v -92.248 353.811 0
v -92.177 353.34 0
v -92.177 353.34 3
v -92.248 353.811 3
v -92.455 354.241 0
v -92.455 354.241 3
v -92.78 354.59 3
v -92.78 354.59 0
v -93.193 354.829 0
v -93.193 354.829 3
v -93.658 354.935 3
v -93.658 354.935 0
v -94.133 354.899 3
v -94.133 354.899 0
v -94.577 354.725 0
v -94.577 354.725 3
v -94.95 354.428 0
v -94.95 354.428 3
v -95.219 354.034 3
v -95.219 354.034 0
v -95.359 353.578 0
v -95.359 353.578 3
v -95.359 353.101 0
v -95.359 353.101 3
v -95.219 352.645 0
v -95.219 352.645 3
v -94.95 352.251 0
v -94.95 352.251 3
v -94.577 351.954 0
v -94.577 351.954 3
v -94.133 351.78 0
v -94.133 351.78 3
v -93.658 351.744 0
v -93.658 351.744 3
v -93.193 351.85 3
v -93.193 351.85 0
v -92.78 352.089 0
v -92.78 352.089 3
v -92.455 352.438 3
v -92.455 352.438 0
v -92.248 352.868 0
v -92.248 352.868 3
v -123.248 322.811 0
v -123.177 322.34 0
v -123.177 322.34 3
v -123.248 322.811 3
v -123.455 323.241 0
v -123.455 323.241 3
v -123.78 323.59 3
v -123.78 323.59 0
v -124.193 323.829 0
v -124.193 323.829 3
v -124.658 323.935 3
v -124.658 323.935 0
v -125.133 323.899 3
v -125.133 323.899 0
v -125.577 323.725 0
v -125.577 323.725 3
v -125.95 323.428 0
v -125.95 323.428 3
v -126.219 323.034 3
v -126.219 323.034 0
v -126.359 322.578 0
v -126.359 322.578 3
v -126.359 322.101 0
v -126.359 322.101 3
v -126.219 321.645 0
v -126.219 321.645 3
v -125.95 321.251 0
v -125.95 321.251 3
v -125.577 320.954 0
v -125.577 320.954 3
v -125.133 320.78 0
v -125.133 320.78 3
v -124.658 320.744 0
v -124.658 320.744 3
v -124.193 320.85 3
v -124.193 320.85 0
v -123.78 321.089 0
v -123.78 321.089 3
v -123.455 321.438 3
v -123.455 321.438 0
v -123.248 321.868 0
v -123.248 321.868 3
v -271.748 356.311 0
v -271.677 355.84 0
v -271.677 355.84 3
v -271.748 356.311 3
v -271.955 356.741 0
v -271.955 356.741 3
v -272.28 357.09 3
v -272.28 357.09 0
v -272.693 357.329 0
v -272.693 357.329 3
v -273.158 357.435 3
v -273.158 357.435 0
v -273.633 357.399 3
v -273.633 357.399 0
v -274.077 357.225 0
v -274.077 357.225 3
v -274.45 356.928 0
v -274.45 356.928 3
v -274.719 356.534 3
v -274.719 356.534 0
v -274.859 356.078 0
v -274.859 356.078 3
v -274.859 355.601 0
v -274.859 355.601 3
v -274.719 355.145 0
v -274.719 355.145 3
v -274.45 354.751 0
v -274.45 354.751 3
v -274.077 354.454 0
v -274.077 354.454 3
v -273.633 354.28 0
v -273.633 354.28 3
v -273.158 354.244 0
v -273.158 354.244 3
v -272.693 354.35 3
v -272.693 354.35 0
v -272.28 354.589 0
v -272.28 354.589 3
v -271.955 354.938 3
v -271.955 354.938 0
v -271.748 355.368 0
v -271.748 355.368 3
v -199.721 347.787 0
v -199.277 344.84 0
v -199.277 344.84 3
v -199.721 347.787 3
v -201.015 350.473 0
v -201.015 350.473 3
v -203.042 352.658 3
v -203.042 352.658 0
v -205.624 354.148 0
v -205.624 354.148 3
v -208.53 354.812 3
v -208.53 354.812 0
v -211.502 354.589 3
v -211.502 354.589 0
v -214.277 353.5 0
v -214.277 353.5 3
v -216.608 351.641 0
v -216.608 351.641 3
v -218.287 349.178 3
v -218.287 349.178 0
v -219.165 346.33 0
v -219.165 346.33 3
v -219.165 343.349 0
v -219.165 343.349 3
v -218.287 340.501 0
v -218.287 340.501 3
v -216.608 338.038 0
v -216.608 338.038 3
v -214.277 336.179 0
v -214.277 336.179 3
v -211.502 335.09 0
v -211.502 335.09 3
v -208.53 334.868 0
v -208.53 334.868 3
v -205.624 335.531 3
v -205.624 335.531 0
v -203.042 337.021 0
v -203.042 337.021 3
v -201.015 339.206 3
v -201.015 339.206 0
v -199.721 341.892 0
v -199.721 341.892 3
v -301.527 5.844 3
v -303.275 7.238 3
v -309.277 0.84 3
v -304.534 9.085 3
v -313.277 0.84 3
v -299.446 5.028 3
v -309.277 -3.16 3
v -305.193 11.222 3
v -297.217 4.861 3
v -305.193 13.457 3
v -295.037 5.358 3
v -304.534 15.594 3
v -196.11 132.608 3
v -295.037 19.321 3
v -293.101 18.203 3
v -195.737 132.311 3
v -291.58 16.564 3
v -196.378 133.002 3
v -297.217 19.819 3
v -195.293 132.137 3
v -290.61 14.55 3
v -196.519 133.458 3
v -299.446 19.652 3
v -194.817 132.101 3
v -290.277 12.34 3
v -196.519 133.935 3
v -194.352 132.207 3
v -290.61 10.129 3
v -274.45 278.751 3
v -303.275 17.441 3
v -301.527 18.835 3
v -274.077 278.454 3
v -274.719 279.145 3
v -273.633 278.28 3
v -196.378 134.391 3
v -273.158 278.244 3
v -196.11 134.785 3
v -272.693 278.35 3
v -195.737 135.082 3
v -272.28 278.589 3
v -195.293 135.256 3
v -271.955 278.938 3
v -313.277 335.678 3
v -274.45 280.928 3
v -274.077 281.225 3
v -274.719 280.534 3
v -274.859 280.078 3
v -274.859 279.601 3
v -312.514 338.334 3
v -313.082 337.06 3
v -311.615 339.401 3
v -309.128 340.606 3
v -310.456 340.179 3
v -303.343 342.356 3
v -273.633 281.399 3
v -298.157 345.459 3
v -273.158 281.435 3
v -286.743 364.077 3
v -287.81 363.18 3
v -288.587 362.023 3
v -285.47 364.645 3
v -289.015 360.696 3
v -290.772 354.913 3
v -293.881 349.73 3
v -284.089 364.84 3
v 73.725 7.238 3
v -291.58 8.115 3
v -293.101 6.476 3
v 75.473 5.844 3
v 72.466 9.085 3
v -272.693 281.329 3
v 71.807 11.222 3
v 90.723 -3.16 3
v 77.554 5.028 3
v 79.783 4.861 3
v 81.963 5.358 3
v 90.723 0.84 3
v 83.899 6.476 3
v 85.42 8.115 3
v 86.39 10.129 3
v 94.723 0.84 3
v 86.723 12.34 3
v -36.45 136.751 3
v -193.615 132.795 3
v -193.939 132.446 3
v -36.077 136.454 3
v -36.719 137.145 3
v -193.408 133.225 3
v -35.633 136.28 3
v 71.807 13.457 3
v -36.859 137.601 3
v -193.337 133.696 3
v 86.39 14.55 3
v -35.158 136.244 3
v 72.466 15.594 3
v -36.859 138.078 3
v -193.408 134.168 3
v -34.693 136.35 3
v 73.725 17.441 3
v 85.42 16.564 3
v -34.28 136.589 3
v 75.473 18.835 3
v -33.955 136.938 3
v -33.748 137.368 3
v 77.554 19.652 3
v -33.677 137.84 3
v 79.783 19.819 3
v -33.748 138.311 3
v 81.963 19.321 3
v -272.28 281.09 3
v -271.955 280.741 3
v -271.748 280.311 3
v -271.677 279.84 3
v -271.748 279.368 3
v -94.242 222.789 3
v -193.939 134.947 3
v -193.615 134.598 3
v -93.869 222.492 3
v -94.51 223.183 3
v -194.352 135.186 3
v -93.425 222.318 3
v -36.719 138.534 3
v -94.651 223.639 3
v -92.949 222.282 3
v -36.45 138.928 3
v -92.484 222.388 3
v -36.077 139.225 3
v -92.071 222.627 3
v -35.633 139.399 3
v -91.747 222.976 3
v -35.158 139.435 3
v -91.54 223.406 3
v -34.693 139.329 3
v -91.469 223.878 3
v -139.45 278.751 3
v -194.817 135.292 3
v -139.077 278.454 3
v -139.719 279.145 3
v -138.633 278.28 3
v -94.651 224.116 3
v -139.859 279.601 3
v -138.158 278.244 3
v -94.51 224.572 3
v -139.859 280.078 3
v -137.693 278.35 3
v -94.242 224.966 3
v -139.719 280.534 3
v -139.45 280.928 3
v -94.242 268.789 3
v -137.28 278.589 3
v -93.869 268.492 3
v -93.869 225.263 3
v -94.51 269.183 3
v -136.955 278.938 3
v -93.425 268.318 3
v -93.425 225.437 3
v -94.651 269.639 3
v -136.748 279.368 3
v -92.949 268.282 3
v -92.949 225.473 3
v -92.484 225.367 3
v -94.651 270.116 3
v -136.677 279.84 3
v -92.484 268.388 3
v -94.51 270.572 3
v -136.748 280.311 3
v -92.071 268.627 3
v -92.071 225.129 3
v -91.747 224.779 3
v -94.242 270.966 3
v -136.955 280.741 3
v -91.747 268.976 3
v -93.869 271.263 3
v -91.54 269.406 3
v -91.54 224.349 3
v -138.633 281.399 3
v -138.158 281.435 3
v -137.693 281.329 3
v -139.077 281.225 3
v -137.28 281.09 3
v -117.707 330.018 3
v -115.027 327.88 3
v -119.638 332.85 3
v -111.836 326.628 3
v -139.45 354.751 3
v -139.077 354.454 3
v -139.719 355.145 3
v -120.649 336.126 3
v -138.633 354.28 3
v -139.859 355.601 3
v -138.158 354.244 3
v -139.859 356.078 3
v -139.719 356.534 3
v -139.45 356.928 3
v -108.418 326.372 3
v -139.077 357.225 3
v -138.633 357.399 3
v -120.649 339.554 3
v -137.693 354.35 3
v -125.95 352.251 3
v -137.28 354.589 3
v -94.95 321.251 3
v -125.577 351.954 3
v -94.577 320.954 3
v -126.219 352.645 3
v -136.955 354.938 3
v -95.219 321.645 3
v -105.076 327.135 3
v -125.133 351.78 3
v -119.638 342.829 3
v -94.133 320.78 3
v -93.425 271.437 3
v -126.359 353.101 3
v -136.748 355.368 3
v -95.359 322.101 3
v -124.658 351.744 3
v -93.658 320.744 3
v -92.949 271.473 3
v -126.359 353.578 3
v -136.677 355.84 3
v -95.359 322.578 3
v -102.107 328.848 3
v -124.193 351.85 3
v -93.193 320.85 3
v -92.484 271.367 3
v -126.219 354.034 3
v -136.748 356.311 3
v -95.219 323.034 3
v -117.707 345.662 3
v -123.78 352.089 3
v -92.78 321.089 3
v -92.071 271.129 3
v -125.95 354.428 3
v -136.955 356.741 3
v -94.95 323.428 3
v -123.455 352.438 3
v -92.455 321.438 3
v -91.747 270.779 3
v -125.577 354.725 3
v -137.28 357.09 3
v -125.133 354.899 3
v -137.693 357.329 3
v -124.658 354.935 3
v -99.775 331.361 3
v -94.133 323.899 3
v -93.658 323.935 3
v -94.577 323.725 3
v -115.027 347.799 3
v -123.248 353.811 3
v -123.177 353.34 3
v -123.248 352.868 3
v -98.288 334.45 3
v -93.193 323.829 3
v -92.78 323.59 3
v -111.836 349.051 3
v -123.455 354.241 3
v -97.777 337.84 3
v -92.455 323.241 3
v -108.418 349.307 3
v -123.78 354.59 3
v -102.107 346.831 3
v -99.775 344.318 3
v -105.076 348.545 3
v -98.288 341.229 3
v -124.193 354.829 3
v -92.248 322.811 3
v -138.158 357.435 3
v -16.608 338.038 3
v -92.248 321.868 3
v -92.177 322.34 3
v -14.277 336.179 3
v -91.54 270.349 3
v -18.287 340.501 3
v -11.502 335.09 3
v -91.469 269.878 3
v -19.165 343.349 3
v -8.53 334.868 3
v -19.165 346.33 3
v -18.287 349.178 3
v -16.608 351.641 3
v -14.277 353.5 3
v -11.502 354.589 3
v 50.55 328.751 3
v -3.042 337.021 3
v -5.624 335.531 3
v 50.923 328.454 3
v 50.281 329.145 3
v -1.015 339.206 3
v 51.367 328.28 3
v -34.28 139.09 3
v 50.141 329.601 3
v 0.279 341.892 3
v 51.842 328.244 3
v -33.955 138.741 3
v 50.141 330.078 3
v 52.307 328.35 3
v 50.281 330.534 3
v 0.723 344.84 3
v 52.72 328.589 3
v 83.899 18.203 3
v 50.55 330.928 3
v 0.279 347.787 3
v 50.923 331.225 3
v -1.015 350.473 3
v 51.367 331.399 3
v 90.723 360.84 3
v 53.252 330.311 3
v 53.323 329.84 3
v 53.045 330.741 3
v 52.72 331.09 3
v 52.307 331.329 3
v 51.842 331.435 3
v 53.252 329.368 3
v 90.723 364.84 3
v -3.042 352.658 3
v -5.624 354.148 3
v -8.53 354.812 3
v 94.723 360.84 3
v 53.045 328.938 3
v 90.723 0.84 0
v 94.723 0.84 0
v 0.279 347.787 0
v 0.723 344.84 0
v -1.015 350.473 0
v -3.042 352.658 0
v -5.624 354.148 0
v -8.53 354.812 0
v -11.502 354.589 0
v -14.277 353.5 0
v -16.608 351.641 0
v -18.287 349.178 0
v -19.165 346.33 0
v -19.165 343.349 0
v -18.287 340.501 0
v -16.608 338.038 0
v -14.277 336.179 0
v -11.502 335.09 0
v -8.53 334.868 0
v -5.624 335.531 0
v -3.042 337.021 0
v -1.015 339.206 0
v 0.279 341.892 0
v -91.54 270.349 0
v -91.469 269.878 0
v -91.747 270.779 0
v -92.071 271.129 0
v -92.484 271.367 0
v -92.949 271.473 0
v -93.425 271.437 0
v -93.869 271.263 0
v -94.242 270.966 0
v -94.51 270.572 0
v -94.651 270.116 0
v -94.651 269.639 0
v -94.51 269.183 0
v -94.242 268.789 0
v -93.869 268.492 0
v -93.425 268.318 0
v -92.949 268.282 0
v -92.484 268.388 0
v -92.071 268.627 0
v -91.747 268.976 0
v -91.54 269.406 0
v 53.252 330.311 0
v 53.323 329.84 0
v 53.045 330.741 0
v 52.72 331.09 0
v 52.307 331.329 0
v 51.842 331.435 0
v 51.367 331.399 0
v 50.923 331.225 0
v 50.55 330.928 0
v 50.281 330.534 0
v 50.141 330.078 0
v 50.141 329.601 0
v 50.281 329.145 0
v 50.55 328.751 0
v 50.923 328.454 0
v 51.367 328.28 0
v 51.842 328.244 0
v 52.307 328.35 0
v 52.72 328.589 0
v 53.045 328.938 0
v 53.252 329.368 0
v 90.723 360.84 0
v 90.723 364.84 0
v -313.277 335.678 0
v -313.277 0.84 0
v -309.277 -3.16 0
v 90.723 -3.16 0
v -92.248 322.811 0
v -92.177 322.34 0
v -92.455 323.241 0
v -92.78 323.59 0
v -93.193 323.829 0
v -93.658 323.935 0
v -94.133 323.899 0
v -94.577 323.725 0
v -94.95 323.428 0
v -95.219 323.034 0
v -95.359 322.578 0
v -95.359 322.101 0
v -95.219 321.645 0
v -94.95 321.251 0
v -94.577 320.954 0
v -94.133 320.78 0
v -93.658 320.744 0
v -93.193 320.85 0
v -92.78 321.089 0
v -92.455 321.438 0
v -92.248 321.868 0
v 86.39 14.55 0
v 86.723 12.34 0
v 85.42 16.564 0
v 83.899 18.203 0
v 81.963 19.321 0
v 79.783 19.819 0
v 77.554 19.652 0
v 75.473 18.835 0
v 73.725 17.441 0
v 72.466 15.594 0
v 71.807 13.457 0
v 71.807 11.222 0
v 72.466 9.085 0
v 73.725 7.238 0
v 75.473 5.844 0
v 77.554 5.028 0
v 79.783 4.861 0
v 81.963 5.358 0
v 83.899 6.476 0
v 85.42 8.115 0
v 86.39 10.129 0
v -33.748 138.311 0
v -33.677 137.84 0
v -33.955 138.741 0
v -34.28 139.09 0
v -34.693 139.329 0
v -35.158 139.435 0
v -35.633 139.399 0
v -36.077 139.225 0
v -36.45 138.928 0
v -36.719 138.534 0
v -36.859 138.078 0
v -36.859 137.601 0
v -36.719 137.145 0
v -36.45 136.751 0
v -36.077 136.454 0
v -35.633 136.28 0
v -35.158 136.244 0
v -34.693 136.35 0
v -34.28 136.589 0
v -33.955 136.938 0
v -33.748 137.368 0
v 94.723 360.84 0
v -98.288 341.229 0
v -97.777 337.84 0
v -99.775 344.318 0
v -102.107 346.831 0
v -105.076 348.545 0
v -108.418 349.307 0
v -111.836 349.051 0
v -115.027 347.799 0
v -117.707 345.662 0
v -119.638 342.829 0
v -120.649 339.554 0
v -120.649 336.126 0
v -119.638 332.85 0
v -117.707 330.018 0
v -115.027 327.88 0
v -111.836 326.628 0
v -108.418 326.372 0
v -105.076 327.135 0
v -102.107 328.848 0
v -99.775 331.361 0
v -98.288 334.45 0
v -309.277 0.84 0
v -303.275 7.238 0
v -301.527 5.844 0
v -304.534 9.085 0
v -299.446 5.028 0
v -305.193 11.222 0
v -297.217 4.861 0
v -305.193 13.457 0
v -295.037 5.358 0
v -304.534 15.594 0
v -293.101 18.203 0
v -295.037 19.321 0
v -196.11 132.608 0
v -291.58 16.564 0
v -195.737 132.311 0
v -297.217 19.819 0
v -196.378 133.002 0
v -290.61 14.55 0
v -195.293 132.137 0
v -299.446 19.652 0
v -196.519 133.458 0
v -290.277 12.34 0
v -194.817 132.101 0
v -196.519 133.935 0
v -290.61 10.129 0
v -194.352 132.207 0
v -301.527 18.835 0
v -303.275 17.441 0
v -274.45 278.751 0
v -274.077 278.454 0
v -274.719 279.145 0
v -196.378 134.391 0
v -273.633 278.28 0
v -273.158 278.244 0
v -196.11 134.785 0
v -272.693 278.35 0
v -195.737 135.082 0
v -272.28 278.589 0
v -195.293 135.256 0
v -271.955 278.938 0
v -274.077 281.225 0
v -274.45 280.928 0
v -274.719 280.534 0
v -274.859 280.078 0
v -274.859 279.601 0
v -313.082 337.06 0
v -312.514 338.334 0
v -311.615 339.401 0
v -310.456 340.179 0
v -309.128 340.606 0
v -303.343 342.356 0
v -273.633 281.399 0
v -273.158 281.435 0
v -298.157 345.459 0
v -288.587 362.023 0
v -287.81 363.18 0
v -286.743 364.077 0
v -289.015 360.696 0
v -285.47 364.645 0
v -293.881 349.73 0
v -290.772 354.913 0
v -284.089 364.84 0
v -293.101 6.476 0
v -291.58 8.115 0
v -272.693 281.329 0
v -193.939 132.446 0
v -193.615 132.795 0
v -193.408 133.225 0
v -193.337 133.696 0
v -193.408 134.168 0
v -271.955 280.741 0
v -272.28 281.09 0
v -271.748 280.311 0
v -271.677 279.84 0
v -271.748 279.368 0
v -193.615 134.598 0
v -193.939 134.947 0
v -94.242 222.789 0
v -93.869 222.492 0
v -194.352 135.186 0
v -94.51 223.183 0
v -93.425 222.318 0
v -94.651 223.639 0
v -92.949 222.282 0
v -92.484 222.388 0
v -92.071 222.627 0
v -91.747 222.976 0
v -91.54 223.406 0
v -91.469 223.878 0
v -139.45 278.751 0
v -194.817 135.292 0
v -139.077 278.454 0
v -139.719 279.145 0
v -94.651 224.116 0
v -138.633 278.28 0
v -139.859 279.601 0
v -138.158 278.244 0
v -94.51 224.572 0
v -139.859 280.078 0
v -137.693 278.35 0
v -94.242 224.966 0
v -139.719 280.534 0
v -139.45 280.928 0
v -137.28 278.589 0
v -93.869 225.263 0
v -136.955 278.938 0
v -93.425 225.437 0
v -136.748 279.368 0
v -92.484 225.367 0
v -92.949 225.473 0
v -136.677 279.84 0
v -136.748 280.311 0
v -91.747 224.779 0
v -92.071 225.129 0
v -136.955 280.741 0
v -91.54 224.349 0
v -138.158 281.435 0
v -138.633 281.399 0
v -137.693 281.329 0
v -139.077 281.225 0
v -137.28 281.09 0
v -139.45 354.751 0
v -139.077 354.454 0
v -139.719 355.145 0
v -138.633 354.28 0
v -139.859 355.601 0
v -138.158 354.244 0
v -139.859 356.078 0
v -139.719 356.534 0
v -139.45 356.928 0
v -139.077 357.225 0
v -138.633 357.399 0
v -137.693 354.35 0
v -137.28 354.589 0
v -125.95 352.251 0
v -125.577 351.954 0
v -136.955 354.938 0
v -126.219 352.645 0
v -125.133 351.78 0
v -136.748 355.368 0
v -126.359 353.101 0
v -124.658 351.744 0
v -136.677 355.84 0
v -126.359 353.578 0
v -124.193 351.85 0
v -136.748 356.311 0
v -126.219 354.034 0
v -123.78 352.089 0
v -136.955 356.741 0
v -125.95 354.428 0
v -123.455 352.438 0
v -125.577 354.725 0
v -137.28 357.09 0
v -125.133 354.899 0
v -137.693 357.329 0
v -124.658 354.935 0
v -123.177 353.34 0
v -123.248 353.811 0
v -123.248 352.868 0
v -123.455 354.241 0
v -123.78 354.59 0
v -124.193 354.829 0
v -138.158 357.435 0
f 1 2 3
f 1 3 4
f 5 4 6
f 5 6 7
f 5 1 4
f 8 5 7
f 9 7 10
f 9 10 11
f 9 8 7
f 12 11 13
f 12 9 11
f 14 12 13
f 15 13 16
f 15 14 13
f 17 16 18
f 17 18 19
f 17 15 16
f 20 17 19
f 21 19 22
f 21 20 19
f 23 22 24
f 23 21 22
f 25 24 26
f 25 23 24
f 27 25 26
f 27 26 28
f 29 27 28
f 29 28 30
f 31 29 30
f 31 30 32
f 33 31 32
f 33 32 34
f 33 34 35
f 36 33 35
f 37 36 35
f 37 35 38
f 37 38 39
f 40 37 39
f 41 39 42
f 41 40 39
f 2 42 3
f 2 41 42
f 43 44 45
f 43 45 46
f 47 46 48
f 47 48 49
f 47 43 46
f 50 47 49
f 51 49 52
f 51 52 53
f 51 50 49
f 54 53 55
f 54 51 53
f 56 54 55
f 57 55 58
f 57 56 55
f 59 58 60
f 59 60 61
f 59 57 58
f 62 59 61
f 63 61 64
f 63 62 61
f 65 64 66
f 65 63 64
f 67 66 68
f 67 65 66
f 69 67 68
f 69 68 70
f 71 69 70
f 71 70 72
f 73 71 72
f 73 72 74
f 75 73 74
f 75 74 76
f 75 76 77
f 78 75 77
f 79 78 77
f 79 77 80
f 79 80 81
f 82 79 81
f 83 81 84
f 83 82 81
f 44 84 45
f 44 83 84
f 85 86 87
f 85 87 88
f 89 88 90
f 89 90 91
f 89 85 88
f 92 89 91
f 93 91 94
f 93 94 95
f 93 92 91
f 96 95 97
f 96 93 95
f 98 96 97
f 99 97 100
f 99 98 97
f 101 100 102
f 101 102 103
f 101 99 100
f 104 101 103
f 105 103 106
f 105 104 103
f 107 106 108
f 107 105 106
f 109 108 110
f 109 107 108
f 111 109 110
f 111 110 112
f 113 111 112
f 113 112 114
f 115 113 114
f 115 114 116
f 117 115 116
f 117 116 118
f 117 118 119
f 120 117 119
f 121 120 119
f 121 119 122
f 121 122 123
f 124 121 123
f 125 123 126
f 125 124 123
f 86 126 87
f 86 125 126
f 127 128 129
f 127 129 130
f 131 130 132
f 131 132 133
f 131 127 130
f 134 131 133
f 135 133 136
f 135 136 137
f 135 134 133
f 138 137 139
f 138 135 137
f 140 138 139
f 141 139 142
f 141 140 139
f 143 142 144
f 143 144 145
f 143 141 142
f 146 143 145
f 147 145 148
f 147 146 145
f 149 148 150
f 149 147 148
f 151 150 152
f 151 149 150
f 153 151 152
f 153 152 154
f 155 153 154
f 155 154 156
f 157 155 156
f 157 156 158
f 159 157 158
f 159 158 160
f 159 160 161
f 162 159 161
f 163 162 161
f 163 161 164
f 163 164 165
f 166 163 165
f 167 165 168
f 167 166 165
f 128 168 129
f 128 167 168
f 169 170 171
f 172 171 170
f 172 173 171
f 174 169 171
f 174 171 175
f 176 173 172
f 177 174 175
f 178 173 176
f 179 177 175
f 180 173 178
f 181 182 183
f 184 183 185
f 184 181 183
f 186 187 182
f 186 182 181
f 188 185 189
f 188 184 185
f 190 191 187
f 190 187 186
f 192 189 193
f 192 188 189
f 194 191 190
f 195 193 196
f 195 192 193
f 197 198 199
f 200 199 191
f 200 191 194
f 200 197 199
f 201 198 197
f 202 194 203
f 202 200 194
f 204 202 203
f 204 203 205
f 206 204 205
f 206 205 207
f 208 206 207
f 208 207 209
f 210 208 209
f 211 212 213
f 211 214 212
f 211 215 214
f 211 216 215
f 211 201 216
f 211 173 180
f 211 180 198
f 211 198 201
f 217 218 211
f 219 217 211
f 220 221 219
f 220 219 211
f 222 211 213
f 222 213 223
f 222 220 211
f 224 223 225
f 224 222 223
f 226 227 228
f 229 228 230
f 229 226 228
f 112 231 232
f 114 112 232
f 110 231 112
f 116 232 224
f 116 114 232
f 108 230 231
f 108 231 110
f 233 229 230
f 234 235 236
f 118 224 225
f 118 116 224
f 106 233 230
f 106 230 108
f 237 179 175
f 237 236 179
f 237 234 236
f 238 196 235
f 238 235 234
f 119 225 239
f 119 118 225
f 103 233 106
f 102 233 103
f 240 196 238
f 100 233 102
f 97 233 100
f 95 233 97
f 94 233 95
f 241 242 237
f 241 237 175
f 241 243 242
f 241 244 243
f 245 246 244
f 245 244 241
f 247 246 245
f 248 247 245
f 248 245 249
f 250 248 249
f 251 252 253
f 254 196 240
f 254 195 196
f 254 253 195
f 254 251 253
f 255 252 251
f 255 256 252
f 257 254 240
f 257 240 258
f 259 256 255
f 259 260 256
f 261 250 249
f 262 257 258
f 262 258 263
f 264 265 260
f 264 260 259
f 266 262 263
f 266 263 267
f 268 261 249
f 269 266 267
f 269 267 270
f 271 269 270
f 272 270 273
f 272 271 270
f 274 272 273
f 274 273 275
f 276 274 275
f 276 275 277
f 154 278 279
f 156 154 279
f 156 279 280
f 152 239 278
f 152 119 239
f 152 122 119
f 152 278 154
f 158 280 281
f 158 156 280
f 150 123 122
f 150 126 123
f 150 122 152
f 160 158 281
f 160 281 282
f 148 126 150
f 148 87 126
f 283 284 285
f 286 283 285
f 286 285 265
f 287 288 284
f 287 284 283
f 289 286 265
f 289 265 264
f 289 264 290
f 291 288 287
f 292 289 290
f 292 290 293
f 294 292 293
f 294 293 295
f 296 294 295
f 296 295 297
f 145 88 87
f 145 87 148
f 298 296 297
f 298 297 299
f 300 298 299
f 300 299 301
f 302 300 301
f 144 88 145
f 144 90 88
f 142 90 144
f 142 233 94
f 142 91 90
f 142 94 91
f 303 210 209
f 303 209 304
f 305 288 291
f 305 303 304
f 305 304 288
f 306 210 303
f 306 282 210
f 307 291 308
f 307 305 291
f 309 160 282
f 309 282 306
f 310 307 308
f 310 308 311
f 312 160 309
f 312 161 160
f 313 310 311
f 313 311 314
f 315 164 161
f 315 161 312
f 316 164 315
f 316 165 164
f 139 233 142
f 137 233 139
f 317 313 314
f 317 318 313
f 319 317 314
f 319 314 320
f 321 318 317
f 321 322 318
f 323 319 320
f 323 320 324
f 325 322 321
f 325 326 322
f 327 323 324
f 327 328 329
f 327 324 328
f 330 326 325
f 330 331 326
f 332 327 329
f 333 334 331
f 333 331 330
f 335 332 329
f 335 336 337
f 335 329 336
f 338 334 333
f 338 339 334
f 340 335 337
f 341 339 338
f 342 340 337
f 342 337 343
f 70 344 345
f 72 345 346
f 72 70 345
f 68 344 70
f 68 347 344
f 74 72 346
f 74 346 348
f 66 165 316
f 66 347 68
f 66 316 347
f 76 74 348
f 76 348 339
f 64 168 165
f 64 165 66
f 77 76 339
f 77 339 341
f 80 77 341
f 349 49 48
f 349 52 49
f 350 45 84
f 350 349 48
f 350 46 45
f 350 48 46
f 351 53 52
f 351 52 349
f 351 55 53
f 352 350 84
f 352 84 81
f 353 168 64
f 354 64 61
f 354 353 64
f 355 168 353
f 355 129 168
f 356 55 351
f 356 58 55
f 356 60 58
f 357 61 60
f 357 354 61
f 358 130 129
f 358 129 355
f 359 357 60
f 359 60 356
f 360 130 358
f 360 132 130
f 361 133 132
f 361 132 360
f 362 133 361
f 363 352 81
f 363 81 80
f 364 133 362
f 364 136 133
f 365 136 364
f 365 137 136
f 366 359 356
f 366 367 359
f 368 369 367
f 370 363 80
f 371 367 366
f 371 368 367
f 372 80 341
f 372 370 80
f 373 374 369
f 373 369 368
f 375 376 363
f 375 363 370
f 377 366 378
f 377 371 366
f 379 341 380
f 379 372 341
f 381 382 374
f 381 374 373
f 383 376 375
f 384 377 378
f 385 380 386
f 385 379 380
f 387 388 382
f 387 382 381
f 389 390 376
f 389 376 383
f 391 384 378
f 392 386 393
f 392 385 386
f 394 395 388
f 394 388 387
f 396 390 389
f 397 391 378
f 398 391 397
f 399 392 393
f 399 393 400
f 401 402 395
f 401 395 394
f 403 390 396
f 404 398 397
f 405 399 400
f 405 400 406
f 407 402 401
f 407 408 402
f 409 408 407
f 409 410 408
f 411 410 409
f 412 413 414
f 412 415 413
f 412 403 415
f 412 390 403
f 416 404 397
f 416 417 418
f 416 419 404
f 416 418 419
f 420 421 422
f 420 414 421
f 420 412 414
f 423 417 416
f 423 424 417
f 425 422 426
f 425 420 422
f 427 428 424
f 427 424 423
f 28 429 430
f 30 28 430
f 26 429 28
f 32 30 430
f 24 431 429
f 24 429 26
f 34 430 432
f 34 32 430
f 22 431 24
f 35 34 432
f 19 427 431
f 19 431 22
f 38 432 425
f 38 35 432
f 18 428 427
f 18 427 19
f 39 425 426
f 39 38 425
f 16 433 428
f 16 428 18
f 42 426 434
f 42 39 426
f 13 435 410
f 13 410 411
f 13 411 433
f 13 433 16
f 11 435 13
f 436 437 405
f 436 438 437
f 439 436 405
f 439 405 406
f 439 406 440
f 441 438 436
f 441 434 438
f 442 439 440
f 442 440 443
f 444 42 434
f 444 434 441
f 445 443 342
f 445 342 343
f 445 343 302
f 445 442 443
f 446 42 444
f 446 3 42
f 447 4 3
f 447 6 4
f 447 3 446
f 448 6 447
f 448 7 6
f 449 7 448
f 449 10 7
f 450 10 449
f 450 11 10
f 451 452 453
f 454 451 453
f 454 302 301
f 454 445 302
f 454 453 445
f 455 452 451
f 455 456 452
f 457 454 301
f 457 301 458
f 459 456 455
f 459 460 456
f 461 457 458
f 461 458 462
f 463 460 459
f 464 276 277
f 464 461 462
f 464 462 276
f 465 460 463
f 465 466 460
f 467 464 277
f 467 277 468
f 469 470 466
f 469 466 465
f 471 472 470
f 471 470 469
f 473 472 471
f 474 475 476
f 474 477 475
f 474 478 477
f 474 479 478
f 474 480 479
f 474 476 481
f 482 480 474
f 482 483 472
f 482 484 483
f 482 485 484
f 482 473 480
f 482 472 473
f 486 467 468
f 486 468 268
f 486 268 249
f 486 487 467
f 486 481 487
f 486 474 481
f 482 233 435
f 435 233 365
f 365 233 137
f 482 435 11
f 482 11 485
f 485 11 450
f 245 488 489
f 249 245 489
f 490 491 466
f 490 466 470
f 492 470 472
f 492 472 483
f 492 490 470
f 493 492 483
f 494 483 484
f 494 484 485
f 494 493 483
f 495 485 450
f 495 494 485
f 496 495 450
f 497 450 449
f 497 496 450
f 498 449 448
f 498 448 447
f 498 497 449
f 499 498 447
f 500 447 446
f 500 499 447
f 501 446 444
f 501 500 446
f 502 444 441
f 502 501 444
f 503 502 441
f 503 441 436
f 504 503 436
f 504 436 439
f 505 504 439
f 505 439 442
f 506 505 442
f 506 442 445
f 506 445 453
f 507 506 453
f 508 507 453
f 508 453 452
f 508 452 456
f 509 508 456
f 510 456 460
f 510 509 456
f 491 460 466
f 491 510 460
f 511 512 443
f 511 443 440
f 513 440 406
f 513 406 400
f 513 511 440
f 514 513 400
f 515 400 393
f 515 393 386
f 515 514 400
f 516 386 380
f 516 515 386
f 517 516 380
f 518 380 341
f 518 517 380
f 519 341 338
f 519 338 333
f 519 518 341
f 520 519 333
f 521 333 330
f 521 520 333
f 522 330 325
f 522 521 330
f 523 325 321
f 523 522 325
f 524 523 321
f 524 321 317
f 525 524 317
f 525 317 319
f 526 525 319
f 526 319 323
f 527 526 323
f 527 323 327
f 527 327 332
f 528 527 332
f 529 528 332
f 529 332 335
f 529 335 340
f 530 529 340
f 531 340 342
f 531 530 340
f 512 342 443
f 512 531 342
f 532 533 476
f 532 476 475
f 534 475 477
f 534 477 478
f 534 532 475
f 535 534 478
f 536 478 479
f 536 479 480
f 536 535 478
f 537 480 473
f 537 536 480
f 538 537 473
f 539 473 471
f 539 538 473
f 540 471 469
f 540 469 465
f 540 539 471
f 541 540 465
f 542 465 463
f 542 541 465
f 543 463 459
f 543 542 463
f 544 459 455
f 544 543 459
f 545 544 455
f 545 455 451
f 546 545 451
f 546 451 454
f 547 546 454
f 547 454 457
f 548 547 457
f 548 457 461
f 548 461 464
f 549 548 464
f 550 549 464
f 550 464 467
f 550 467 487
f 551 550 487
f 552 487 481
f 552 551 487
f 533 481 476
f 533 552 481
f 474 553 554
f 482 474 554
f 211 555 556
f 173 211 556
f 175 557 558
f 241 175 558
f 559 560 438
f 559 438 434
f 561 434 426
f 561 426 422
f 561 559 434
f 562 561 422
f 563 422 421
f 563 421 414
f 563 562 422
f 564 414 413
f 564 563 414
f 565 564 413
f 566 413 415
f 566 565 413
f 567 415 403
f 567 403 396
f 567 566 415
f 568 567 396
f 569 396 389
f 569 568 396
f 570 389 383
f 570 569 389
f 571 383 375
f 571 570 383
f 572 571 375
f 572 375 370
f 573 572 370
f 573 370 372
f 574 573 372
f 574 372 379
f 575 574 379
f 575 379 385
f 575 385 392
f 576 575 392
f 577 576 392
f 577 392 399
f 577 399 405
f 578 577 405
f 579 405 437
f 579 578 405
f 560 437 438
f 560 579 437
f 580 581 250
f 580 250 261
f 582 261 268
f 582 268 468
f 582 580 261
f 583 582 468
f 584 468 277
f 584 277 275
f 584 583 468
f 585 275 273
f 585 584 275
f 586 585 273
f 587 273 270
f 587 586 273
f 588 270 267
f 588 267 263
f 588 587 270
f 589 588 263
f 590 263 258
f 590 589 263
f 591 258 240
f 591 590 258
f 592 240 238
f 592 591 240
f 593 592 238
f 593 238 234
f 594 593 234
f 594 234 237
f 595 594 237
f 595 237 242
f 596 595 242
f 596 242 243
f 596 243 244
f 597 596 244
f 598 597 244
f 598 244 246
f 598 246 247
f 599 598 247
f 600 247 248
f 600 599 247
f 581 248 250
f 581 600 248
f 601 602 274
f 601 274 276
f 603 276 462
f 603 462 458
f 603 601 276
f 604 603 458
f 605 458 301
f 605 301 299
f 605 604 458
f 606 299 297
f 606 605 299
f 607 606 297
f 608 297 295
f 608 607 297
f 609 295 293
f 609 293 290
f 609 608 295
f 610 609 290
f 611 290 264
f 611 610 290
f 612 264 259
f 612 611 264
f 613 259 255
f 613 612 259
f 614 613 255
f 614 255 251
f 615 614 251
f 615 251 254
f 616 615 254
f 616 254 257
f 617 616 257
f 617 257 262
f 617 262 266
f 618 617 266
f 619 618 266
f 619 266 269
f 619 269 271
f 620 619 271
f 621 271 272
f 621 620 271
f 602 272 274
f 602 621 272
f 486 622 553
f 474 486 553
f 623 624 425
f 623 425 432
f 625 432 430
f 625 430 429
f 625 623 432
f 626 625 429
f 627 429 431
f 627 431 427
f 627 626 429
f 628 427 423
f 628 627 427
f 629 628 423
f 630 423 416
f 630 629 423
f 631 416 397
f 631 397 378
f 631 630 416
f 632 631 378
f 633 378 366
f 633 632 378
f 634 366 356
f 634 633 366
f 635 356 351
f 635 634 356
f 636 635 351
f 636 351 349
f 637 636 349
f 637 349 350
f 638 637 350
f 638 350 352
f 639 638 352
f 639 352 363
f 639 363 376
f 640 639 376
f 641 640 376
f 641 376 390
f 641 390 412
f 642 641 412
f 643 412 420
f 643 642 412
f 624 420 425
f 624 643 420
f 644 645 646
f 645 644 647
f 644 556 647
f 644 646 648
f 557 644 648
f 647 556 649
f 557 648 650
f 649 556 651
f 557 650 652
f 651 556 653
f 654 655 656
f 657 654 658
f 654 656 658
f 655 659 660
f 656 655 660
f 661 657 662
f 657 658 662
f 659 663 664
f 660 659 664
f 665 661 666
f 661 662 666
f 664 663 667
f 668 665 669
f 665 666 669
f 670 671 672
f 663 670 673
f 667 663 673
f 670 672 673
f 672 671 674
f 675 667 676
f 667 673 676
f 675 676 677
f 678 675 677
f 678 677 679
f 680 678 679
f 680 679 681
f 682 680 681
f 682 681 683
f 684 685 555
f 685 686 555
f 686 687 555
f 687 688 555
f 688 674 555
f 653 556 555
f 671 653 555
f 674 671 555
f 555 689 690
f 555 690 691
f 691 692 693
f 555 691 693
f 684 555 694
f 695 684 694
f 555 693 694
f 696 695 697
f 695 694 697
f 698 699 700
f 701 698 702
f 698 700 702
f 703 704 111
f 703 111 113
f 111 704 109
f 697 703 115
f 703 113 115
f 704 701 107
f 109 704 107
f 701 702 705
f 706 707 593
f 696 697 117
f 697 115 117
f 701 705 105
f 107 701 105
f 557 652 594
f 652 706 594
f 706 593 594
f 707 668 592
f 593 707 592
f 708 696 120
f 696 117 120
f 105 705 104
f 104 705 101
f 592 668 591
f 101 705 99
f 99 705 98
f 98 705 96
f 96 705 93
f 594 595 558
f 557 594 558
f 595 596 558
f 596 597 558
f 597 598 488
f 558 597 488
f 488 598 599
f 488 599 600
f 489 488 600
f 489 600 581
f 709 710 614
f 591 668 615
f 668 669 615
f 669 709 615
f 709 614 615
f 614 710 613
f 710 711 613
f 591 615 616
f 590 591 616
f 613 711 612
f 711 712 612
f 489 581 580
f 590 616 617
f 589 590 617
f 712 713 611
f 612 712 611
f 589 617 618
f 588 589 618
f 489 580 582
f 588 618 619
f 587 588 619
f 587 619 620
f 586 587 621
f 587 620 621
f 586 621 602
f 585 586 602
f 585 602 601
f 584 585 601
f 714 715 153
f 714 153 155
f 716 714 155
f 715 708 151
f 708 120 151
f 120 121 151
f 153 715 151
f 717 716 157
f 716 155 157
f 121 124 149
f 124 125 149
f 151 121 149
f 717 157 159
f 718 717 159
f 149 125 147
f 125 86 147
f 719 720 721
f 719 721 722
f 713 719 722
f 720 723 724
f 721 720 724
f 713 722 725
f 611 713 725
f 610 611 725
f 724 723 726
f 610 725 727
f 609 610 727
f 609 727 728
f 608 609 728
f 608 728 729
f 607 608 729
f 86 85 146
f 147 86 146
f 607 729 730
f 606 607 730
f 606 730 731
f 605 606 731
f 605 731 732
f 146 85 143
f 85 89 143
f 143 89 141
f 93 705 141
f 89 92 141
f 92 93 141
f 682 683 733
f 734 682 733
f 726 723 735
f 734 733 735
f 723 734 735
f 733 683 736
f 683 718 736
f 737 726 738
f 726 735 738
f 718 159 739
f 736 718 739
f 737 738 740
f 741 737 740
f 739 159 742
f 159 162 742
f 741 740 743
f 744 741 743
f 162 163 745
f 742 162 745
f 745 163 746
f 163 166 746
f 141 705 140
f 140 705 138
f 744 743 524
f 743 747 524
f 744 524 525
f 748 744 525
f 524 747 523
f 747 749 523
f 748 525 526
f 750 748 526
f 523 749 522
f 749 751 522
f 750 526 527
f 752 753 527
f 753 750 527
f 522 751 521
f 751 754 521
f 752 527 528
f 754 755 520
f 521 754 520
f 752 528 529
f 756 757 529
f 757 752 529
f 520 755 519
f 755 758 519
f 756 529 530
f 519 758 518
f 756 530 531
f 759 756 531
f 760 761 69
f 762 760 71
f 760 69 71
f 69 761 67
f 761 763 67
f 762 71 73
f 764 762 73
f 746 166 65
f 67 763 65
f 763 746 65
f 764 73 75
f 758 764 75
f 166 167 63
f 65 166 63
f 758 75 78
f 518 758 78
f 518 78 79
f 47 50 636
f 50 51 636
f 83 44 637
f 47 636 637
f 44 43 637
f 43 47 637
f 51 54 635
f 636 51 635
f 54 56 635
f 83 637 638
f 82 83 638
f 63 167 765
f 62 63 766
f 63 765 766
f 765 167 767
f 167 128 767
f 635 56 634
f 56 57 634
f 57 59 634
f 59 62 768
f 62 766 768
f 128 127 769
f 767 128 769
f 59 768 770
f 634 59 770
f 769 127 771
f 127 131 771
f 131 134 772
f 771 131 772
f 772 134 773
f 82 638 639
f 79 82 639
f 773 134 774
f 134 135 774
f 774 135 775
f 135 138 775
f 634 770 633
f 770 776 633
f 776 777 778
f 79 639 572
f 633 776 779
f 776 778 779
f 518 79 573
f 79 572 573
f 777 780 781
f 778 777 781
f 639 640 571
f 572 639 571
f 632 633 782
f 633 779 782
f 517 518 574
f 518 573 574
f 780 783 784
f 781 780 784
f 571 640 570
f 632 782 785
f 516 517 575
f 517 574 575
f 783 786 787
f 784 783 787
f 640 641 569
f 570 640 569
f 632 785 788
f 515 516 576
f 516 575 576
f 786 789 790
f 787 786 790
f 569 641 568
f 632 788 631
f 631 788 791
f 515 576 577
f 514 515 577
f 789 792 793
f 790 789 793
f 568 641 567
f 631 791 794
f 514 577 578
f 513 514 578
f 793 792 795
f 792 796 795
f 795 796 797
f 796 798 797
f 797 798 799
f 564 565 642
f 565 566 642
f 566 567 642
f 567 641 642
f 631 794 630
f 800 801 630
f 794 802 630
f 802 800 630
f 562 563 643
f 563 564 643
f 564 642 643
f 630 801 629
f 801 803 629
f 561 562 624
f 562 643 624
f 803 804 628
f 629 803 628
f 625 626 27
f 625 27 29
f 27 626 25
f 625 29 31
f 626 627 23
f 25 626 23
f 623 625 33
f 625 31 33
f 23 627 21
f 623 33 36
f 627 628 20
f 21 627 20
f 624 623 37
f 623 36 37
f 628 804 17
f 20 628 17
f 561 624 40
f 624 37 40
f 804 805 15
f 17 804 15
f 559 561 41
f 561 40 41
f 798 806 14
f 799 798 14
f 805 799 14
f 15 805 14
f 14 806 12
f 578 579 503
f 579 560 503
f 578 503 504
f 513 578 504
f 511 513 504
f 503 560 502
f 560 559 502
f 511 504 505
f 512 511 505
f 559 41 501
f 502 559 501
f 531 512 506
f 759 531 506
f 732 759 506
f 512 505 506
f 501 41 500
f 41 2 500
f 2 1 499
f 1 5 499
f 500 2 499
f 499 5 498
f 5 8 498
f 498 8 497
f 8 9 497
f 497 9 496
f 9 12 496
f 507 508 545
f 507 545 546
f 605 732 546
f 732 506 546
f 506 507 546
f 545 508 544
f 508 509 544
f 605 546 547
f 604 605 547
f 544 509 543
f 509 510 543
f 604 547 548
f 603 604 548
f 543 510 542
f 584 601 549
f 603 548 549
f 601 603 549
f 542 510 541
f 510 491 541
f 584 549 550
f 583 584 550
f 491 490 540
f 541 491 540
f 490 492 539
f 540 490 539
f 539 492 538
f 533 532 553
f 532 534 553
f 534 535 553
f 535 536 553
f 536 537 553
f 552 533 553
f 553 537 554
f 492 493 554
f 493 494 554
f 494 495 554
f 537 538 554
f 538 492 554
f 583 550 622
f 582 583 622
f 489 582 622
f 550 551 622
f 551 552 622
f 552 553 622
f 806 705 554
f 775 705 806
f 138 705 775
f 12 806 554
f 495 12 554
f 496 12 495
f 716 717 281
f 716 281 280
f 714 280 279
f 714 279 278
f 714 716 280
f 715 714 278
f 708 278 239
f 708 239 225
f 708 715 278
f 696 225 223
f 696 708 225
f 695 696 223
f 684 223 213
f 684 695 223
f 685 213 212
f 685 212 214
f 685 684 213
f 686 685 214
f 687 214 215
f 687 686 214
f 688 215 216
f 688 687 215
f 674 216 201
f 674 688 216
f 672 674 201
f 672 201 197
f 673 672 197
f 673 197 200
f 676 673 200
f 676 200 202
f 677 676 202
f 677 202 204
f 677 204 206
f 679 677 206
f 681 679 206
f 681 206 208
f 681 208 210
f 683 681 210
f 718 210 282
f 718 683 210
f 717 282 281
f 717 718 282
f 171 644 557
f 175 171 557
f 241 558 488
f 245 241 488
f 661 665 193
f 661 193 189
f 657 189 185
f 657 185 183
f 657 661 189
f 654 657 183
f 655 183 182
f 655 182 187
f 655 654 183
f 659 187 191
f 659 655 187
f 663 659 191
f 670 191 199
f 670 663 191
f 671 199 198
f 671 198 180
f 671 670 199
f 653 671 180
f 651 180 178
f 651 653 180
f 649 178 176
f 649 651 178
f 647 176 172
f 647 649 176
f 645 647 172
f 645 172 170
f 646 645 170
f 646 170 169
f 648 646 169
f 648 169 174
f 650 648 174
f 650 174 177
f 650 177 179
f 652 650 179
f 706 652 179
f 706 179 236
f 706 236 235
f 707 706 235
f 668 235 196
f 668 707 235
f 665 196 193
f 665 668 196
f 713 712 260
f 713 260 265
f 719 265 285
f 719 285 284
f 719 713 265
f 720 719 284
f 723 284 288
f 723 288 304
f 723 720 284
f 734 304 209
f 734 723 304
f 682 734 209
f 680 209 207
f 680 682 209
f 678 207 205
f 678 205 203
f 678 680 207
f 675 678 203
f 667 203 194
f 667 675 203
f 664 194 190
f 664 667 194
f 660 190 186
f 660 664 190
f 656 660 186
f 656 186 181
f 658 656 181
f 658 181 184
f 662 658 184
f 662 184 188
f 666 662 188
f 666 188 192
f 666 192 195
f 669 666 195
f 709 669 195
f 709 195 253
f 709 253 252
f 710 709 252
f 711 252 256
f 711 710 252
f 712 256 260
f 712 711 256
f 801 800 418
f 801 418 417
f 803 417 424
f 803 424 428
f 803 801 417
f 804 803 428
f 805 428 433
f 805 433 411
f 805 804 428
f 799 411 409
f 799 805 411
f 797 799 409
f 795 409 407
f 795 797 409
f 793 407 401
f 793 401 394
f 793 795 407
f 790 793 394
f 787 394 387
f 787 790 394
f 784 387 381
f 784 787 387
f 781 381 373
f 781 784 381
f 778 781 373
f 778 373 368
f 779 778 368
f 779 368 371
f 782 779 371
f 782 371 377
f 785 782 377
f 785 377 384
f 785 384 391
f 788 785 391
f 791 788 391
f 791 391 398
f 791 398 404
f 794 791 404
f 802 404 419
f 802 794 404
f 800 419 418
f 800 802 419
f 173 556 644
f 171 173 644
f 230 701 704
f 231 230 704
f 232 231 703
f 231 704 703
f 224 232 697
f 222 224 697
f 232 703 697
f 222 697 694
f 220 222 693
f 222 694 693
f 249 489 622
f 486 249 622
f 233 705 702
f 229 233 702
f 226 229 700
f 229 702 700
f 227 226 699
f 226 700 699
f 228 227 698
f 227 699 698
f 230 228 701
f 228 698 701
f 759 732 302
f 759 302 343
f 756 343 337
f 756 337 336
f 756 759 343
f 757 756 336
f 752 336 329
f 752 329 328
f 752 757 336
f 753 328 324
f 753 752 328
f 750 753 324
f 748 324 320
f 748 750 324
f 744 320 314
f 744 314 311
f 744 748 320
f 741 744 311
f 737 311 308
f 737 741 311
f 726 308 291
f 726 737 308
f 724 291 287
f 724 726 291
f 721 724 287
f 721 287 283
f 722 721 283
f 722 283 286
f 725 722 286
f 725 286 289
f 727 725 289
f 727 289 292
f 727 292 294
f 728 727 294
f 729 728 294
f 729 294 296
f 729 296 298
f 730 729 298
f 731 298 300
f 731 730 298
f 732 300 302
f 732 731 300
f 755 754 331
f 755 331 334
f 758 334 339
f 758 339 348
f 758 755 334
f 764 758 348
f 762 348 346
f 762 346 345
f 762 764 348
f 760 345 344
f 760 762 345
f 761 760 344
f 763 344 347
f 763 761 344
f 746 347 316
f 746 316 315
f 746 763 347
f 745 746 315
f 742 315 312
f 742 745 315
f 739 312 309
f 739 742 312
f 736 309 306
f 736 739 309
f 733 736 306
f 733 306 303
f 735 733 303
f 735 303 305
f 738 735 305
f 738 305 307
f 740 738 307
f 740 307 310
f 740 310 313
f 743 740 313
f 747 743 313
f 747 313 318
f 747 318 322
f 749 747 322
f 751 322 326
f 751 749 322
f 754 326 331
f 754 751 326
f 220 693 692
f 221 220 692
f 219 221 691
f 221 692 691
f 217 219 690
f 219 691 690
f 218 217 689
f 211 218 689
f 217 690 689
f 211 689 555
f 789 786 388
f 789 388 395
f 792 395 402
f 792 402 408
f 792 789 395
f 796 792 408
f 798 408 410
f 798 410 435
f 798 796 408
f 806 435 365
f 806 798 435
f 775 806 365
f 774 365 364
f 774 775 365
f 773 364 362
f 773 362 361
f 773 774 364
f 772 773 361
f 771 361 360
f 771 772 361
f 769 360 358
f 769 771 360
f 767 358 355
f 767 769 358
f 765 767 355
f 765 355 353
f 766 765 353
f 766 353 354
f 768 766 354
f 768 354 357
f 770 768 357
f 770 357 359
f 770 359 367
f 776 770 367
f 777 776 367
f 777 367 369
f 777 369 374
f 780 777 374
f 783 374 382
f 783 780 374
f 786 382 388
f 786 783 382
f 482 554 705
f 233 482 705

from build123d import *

# Parameters (mm, degrees)
F0_R     = 7.5
F0_R_2   = 1.6
F0_R_3   = 10
F0_R_4   = 11.5
F1_DEPTH = 3


with BuildPart() as f1:
    # F0 (on Top) → F1 (new body)
    with BuildSketch(Plane.XY):
        with BuildLine():
            Line((90.722883, 364.83956), (-284.089221, 364.83956))
            ThreePointArc((-284.089221, 364.83956), (-287.307803, 363.665882), (-289.015352, 360.695854))
            ThreePointArc((-289.015352, 360.695854), (-295.88796, 347.463485), (-309.127945, 340.605561))
            ThreePointArc((-309.127945, 340.605561), (-312.101652, 338.899187), (-313.277117, 335.678484))
            Line((-313.277117, 335.678484), (-313.277117, 0.83956))
            Line((-313.277117, 0.83956), (-309.277117, 0.83956))
            Line((-309.277117, 0.83956), (-309.277117, -3.16044))
            Line((-309.277117, -3.16044), (90.722883, -3.16044))
            Line((90.722883, -3.16044), (90.722883, 0.83956))
            Line((90.722883, 0.83956), (94.722883, 0.83956))
            Line((94.722883, 0.83956), (94.722883, 360.83956))
            Line((94.722883, 360.83956), (90.722883, 360.83956))
            Line((90.722883, 360.83956), (90.722883, 364.83956))
        make_face()
        with Locations((-297.777117, 12.33956)):
            Circle(F0_R, mode=Mode.SUBTRACT)
        with Locations((-194.936931, 133.696496)):
            Circle(F0_R_2, mode=Mode.SUBTRACT)
        with Locations((79.222883, 12.33956)):
            Circle(F0_R, mode=Mode.SUBTRACT)
        with Locations((-35.277117, 137.83956)):
            Circle(F0_R_2, mode=Mode.SUBTRACT)
        with Locations((-273.277117, 279.83956)):
            Circle(F0_R_2, mode=Mode.SUBTRACT)
        with Locations((-273.277117, 355.83956)):
            Circle(F0_R_2, mode=Mode.SUBTRACT)
        with Locations((-138.277117, 279.83956)):
            Circle(F0_R_2, mode=Mode.SUBTRACT)
        with Locations((-209.277117, 344.83956)):
            Circle(F0_R_3, mode=Mode.SUBTRACT)
        with Locations((-124.777117, 322.33956)):
            Circle(F0_R_2, mode=Mode.SUBTRACT)
        with Locations((-138.277117, 355.83956)):
            Circle(F0_R_2, mode=Mode.SUBTRACT)
        with Locations((-124.777117, 353.33956)):
            Circle(F0_R_2, mode=Mode.SUBTRACT)
        with Locations((-93.068697, 223.877582)):
            Circle(F0_R_2, mode=Mode.SUBTRACT)
        with Locations((-93.068697, 269.877582)):
            Circle(F0_R_2, mode=Mode.SUBTRACT)
        with Locations((-93.777117, 322.33956)):
            Circle(F0_R_2, mode=Mode.SUBTRACT)
        with Locations((-109.277117, 337.83956)):
            Circle(F0_R_4, mode=Mode.SUBTRACT)
        with Locations((-93.777117, 353.33956)):
            Circle(F0_R_2, mode=Mode.SUBTRACT)
        with Locations((-9.277117, 344.83956)):
            Circle(F0_R_3, mode=Mode.SUBTRACT)
        with Locations((51.722883, 329.83956)):
            Circle(F0_R_2, mode=Mode.SUBTRACT)
    extrude(amount=F1_DEPTH)


solid = f1.part
